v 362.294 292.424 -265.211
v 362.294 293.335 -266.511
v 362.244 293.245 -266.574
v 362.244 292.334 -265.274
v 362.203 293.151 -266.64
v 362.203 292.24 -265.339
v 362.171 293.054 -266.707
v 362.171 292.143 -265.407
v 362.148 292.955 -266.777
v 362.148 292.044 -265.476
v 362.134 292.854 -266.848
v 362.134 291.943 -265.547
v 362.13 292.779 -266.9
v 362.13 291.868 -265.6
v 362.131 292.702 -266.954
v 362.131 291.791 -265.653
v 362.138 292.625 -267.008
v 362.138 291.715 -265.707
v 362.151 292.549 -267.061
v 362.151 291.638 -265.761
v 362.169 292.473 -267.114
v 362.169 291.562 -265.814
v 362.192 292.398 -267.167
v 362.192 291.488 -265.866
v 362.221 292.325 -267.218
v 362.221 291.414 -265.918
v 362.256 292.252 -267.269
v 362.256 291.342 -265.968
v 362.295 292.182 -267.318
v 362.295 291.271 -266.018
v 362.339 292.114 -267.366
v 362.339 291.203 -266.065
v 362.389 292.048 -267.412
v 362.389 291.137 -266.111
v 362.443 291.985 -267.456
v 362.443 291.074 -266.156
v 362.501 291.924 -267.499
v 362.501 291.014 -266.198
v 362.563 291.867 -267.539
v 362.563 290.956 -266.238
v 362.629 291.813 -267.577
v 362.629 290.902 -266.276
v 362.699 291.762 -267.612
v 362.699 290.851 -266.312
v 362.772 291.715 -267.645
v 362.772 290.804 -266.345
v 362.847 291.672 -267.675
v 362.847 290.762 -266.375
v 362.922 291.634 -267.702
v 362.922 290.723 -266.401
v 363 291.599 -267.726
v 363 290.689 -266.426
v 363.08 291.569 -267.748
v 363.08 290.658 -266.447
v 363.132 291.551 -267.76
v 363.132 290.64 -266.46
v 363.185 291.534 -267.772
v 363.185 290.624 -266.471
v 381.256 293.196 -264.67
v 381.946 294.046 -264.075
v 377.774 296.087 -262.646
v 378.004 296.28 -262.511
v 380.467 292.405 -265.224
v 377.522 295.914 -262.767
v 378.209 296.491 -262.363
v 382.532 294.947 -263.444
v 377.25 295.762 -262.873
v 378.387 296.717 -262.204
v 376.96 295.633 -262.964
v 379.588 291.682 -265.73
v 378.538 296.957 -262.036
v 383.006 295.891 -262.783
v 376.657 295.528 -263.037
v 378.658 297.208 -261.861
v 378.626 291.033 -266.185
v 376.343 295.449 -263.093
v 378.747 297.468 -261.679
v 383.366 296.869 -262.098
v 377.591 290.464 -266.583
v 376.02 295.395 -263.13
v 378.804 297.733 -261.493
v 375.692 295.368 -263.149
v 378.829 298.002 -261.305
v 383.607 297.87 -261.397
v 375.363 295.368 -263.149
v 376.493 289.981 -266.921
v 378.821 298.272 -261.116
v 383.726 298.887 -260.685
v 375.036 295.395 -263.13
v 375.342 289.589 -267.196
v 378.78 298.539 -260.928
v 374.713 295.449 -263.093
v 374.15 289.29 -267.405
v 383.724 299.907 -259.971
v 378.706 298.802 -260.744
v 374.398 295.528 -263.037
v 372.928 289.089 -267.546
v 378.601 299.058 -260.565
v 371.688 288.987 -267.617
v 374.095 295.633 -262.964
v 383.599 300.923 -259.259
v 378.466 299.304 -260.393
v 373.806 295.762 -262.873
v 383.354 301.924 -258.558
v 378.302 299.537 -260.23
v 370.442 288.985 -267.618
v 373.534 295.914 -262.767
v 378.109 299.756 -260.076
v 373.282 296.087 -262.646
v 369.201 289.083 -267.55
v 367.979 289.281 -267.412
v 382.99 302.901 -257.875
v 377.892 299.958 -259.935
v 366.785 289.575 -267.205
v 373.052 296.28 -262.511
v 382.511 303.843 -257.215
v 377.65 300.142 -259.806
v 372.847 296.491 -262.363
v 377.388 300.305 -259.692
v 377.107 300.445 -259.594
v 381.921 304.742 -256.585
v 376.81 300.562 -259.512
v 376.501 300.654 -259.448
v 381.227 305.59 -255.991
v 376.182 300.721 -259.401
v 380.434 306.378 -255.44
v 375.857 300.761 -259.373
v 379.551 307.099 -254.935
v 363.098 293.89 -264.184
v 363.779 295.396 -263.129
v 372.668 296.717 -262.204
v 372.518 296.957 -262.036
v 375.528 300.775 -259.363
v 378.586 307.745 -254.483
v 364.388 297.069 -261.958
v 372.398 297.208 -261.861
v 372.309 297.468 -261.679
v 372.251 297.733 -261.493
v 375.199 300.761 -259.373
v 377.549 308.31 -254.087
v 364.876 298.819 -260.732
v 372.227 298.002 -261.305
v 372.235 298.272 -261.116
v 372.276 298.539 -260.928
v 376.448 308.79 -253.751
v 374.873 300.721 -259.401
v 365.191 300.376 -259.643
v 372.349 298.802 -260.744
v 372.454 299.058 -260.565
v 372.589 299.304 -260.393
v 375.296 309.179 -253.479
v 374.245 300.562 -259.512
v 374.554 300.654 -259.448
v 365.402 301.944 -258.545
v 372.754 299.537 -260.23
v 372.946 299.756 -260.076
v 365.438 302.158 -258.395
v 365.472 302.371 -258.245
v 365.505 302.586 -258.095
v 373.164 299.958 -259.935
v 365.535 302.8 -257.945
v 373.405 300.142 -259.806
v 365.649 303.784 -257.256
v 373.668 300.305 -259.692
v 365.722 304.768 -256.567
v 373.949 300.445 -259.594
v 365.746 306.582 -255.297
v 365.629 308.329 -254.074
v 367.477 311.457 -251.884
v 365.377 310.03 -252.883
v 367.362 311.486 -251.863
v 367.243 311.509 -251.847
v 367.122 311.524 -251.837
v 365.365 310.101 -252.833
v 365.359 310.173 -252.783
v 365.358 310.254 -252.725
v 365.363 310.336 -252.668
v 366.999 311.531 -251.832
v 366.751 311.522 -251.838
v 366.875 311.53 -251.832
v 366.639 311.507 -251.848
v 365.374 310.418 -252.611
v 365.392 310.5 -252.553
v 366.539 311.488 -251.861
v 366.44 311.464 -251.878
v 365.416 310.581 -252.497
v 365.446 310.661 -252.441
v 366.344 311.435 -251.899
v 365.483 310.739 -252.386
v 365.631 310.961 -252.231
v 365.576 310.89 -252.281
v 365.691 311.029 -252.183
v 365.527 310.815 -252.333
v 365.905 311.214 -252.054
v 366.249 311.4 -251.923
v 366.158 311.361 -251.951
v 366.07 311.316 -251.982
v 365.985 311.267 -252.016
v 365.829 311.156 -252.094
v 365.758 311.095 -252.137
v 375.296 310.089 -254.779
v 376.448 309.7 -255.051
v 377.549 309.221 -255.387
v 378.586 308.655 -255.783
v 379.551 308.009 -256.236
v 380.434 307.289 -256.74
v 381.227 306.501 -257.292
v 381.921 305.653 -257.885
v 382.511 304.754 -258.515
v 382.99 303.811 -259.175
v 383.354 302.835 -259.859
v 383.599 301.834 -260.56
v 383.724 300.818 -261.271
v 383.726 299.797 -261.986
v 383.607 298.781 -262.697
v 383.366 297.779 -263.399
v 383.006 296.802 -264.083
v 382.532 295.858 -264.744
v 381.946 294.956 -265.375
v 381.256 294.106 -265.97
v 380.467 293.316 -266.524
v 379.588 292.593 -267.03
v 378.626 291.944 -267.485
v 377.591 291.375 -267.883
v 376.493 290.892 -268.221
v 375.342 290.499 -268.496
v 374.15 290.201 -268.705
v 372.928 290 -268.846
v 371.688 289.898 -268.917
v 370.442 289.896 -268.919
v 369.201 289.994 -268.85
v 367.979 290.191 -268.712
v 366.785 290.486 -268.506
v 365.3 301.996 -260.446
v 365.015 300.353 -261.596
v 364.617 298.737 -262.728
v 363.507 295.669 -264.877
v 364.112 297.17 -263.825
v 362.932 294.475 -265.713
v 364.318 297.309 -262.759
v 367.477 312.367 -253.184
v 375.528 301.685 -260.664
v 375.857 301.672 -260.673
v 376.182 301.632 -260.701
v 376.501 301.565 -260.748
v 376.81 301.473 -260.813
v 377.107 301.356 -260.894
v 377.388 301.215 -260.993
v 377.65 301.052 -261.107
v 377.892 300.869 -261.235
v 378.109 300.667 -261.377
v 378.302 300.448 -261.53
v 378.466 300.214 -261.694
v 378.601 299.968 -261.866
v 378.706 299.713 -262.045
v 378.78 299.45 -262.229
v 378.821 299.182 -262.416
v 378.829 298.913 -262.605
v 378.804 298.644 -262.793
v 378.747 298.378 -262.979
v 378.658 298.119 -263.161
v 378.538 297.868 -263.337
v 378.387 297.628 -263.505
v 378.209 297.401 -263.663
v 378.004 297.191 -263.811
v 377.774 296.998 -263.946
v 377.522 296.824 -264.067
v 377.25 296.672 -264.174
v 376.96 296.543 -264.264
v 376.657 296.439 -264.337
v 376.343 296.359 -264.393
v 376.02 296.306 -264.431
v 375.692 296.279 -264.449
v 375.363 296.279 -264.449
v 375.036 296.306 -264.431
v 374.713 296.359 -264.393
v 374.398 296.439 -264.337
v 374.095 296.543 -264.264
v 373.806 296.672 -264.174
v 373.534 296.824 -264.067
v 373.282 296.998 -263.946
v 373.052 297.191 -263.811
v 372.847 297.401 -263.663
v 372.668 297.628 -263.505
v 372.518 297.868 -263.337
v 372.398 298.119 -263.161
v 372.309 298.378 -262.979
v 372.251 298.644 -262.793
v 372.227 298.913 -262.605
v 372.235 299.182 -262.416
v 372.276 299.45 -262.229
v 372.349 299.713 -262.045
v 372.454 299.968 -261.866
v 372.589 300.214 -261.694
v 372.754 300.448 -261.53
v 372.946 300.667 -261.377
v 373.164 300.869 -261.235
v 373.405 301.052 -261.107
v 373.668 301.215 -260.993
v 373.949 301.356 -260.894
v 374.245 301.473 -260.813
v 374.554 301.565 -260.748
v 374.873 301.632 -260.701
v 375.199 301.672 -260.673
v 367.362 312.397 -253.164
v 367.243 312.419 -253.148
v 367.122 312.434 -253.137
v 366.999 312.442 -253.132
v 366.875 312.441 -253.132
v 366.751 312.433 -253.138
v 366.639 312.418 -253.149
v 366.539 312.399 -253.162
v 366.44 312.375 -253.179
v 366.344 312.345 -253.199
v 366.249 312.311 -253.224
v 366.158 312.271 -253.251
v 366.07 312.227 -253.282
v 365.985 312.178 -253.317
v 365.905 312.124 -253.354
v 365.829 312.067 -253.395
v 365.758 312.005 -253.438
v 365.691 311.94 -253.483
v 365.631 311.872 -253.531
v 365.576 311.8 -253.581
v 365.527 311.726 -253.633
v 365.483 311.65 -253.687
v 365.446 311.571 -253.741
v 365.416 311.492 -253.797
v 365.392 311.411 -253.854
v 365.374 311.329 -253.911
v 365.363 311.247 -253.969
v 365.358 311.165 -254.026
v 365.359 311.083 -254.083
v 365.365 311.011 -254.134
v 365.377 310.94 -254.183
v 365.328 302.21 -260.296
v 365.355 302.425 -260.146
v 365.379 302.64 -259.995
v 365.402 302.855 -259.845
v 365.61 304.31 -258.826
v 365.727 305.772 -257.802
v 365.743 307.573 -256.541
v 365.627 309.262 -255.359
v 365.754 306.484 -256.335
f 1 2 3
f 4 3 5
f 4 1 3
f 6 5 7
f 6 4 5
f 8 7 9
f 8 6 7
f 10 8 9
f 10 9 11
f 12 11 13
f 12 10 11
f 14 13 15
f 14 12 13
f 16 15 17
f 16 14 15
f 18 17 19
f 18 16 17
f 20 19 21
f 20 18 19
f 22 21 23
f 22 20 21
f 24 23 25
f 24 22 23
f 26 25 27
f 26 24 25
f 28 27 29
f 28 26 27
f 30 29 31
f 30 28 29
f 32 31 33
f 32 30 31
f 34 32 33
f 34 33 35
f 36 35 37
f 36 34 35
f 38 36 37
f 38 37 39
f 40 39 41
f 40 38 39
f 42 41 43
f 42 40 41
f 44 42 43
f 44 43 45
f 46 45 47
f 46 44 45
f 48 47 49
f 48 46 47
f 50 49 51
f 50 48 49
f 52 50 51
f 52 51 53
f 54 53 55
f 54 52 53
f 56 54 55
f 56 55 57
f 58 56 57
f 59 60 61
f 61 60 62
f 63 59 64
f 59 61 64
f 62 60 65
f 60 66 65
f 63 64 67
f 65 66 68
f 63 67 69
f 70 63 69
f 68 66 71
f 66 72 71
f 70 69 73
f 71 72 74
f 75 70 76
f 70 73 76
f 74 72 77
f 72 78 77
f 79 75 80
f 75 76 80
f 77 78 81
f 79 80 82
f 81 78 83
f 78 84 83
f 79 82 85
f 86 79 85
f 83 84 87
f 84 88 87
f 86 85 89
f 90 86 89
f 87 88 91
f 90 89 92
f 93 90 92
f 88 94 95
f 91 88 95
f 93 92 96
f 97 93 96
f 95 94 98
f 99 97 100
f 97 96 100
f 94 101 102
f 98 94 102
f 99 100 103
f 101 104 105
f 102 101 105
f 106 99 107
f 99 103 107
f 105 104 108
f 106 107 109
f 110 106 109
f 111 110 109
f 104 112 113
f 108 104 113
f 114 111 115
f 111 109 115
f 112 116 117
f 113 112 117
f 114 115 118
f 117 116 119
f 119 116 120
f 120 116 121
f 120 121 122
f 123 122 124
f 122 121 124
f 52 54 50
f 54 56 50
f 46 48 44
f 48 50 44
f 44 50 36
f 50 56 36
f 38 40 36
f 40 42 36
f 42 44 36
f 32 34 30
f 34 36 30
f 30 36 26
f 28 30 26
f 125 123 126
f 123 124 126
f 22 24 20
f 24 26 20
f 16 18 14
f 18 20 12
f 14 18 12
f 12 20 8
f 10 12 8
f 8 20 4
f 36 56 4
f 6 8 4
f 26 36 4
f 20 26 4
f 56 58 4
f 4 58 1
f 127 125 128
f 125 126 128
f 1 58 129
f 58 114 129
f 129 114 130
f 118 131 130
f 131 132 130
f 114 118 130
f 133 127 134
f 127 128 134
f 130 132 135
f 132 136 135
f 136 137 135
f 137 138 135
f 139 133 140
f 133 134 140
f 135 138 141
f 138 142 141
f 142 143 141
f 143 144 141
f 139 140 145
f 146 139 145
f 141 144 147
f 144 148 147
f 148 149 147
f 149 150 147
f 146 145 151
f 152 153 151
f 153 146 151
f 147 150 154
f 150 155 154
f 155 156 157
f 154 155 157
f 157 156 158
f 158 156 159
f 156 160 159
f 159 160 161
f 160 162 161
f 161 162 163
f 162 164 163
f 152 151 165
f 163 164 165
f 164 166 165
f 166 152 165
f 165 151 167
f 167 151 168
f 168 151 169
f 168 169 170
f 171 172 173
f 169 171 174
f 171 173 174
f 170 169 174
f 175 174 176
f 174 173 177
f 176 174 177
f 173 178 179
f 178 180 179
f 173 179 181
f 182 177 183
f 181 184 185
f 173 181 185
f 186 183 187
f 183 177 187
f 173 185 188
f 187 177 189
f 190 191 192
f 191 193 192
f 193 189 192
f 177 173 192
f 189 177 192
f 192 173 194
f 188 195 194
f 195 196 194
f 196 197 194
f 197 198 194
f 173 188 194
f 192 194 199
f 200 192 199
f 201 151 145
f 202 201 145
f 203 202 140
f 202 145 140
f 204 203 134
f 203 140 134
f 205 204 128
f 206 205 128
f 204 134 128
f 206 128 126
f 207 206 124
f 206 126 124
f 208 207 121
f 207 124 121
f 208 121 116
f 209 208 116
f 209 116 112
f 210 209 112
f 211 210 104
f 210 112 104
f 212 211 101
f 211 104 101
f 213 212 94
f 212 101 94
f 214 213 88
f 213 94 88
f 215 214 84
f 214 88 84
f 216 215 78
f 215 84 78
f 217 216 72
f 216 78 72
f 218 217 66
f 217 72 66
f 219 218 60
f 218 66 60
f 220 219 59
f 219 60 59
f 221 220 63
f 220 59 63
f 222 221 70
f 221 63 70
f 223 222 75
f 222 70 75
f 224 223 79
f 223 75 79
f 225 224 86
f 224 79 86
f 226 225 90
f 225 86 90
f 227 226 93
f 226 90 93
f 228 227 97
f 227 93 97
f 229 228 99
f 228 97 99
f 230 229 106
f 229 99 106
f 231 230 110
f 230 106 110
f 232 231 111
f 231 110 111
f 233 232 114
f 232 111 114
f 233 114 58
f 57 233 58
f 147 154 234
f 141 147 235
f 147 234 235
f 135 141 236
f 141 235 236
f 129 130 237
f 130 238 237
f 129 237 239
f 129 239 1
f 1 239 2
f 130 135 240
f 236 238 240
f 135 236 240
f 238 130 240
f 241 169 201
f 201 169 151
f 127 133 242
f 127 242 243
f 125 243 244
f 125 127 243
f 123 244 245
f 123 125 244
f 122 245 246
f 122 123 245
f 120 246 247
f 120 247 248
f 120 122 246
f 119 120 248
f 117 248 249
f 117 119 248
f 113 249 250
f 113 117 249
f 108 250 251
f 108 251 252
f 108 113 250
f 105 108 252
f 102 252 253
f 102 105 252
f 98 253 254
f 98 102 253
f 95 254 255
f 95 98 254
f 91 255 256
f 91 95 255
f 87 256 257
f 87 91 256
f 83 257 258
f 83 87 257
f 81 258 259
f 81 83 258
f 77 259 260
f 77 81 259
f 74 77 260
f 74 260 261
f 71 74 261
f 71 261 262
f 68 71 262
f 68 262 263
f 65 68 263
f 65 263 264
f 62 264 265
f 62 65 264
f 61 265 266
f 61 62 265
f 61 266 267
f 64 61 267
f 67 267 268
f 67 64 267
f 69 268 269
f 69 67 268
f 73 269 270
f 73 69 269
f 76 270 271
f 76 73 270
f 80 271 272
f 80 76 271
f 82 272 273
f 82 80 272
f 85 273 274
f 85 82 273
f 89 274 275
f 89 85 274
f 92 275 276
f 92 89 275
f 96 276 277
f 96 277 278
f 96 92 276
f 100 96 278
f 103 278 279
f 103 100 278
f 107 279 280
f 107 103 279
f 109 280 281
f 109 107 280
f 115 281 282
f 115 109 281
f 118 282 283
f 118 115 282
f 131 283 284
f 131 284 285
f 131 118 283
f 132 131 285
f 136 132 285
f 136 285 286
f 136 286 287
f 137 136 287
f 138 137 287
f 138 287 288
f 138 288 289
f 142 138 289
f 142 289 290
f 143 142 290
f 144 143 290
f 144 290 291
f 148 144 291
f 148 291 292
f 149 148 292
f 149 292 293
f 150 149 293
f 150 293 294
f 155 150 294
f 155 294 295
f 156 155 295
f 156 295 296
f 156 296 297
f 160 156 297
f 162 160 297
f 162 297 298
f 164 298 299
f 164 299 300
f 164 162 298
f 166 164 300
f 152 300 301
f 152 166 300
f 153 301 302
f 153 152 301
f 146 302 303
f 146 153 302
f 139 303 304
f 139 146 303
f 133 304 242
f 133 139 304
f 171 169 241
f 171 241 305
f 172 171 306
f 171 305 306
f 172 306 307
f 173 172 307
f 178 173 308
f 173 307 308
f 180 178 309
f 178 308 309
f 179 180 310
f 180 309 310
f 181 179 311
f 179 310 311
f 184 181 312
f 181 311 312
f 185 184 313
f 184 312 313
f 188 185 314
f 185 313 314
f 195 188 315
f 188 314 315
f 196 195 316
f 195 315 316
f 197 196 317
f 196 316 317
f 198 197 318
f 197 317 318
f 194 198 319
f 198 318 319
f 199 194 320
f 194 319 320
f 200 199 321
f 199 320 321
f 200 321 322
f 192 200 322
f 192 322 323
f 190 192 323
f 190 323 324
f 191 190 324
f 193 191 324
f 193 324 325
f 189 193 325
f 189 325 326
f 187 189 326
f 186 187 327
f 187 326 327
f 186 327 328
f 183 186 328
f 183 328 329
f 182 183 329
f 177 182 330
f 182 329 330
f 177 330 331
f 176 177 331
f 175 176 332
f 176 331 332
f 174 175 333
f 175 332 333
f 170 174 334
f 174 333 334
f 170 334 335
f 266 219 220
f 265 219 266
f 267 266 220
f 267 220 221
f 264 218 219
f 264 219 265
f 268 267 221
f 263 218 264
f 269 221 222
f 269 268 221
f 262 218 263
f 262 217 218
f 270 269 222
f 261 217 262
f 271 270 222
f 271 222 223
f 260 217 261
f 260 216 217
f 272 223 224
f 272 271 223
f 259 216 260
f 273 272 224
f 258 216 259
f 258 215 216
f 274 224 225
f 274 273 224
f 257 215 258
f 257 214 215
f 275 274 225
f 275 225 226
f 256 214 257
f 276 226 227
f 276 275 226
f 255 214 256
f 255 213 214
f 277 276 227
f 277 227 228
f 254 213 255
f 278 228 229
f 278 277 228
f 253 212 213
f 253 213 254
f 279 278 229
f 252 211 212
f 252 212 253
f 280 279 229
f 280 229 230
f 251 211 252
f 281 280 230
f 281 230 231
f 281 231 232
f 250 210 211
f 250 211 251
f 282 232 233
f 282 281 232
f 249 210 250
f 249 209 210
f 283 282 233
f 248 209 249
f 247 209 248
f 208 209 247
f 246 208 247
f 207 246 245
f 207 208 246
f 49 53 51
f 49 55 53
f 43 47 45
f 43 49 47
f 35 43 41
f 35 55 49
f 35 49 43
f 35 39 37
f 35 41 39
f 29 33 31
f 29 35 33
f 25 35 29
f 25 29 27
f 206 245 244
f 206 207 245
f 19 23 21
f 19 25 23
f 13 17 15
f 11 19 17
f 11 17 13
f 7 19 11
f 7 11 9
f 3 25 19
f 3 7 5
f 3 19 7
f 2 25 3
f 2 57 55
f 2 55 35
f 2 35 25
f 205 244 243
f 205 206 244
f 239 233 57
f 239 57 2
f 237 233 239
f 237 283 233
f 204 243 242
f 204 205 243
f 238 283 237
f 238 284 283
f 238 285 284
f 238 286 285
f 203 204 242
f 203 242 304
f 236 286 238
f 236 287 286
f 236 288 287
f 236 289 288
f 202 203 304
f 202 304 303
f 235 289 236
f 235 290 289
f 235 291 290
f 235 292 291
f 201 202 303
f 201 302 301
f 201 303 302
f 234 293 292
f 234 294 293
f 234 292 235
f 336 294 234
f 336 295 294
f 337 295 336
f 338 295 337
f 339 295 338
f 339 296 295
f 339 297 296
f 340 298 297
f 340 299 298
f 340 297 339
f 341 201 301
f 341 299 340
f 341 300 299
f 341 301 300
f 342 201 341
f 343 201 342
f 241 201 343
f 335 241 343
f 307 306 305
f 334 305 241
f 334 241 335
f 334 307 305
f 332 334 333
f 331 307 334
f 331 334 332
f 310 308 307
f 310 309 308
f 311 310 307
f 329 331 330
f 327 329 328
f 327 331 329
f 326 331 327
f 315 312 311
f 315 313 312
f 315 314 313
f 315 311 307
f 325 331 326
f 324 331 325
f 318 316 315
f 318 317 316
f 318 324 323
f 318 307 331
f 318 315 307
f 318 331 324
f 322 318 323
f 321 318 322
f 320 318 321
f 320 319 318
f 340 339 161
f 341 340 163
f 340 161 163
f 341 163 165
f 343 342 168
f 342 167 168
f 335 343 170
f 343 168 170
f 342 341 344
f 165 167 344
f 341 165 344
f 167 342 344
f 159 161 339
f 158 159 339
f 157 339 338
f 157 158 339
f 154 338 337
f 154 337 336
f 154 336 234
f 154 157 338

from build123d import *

# Parameters (mm, degrees)
SKETCH1_R           = 3.3019999999999836
BOSS_EXTRUDE1_DEPTH = 1.5875
SKETCH2_R           = 12.7
CUT_EXTRUDE2_DEPTH  = 146.57558110485613
CUT_EXTRUDE3_DEPTH  = 400.917308055041
CUT_EXTRUDE4_DEPTH  = 400.91690405439095
FILLET1_R           = 1.5875


with BuildPart() as part:
    # Sketch1 → Boss-Extrude1 (new body)
    with BuildSketch(Plane(origin=(4.715e-14, 220.81273991226263, -315.3532743689599), x_dir=(-1, 7e-17, -1e-16), z_dir=(0, 0.5735764363510497, -0.8191520442889892))):
        with BuildLine():
            Line((-352.9368830837315, 115.82645369700992), (-375.29590907686907, 107.8750150529707))
            ThreePointArc((-375.29590907686907, 107.8750150529707), (-383.0064063960404, 91.65378726062865), (-366.7851786036984, 83.94328994145738))
            Line((-366.7851786036984, 83.94328994145738), (-352.9368830837315, 88.86809624497586))
            Line((-352.9368830837315, 88.86809624497586), (-352.9368830837315, 115.82645369700992))
        make_face()
        with Locations(Location((-375.5277422986924, 94.31339053349453, 0), (0, 0, 90))):
            Circle(SKETCH1_R, mode=Mode.SUBTRACT)
    extrude(amount=BOSS_EXTRUDE1_DEPTH)

    # Sketch2 → Cut-Extrude2 (cut, through all)
    with BuildSketch(Plane(origin=(364.35174229869244, 343.62540364794484, -135.39966553044988), x_dir=(-0.9960075449626111, 0.027318171664055604, 0.08498639817338811), z_dir=(-0.0892690897094424, -0.3047987291070713, -0.9482240053685426))):
        with Locations((-0.03783689084002617, -0.5075300251178305)):
            Circle(SKETCH2_R)
    extrude(amount=CUT_EXTRUDE2_DEPTH, mode=Mode.SUBTRACT)

    # Sketch3 → Cut-Extrude3 (cut, through all)
    with BuildSketch(Plane(origin=(4.734e-14, 221.72329250496995, -316.65367823926863), x_dir=(-1, 7e-17, -1e-16), z_dir=(0, 0.5735764363510497, -0.8191520442889892))):
        with BuildLine():
            Line((-361.4453353005722, 85.84227411038414), (-360.53395932333007, 86.16638260092915))
            Line((-360.53395932333007, 86.16638260092915), (-363.80419645721065, 111.96176050593412))
            add(Edge.make_bspline(
                [(-363.80419645721065, 111.96176050593412), (-368.8920523914014, 98.57905697453593), (-361.4453353005722, 85.84227411038414)],
                knots=[0.8633594194263924, 0.8633594194263924, 0.8633594194263924, 2.2053014206357777, 2.2053014206357777, 2.2053014206357777], degree=2, weights=[1, 0.7832183186966504, 1]))
        make_face()
    extrude(amount=-CUT_EXTRUDE3_DEPTH, mode=Mode.SUBTRACT)

    # Sketch5 → Cut-Extrude4 (cut, through all)
    with BuildSketch(Plane(origin=(4.715e-14, 220.81273991226263, -315.3532743689599), x_dir=(1, -7e-17, 1e-16), z_dir=(0, -0.5735764363510497, 0.8191520442889892))):
        with BuildLine():
            Line((364.81964209388303, 111.600642196092), (363.80419645721065, 111.96176050593412))
            Line((363.80419645721065, 111.96176050593412), (365.40184998669423, 99.04304749276544))
            add(Edge.make_bspline(
                [(365.40184998669423, 99.04304749276544), (366.3557730480568, 105.71124194209018), (364.81964209388303, 111.600642196092)],
                knots=[4.662458191197461, 4.662458191197461, 4.662458191197461, 5.280973611848554, 5.280973611848554, 5.280973611848554], degree=2, weights=[1, 0.9525597493758428, 1]))
        make_face()
    extrude(amount=-CUT_EXTRUDE4_DEPTH, mode=Mode.SUBTRACT)

    # Fillet1
    fillet1_edges = [part.edges().sort_by_distance(p)[0] for p in [
        (361.44533530057225, 291.5858905325532, -266.76637063161013),
        (364.8196420938831, 312.685910407509, -251.99197765879123),
    ]]
    fillet(fillet1_edges, radius=FILLET1_R)


solid = part.part
